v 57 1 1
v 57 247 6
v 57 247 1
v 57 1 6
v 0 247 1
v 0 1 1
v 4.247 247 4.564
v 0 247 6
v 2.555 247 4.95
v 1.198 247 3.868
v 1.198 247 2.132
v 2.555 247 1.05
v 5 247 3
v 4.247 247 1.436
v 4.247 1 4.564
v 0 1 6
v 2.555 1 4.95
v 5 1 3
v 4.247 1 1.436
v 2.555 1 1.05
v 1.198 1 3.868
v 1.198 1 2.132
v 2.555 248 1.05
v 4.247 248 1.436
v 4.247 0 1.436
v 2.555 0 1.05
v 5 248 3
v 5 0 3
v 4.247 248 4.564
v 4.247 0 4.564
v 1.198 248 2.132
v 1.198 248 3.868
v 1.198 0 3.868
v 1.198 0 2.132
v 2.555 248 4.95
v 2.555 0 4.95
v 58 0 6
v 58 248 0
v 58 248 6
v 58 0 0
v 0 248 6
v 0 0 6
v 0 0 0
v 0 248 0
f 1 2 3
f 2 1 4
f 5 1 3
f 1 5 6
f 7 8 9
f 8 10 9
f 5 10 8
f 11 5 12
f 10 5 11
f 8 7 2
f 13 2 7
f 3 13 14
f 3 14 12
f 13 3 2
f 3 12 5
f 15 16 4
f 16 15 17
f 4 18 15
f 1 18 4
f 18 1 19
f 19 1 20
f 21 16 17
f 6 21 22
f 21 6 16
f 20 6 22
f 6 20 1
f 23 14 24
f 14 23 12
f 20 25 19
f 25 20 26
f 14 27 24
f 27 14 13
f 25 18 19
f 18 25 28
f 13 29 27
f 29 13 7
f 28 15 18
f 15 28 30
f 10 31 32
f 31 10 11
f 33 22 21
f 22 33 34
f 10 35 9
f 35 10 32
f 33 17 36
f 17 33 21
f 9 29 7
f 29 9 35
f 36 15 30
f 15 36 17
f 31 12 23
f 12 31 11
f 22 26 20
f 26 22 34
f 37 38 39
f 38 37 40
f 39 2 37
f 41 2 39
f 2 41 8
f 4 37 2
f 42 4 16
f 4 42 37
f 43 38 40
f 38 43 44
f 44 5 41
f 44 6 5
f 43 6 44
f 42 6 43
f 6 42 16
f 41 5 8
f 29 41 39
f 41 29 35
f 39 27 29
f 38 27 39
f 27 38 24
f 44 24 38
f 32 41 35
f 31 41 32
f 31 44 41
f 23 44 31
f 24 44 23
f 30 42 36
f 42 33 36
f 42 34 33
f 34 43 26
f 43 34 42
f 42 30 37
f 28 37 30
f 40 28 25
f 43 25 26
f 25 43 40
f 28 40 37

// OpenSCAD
//Applies To Each "Individual" Container
Length_For_Each_Compartment = 20; //[1:50]

//Applies To Each "Individual" Container
Width_For_Each_Compartment = 35; //[1:50]

//Applies To Entire Model
Height_For_Entire_Model = 15; //[1:50]


//number of boxes

number_days = 7; // [1,2,3,4,5,6,7,8,9,10]
number_per_day = 3; // [1,2,3,4,5,6]

//letters

//One Letter Works Best
row_one = "B"; 

//One Letter Works Best
row_two = "L";

//One Letter Works Best
row_three = "D";

//One Letter Works Best
row_four = "4";

//One Letter Works Best
row_five = "5";

//One Letter Works Best
row_six = "6";

//nub parameter

nubs = 0; //[0:Yes,1:No,2]
//Click Yes If You Are Printing A Lid



//MODEL VARIABLES

//box
length_x = Length_For_Each_Compartment;
width_y = Width_For_Each_Compartment;
height_z = Height_For_Entire_Model;
o_x = length_x;
o_y = width_y;
o_z = height_z;
i_x = o_x-4;
i_y = o_y-4;
i_z = o_z;

//number of days
d = number_days-2;
e = number_days-1;

//number of times per day
n = number_per_day-2;
l = number_per_day-1;




//MODULE - subtraction

module inside(){
union()
{
translate([-1,1,1])cube([((length_x*number_per_day)-(2*l)+2),(width_y*number_days)+1,6]);

translate([3,-1,3])
{
rotate([270,0,0]){cylinder(400,2,2);
}
}
}
}

difference(){
translate([0,0,0])cube([((length_x*number_per_day)-(2*l)+2),(width_y*number_days)+3,6]);
inside();
}
